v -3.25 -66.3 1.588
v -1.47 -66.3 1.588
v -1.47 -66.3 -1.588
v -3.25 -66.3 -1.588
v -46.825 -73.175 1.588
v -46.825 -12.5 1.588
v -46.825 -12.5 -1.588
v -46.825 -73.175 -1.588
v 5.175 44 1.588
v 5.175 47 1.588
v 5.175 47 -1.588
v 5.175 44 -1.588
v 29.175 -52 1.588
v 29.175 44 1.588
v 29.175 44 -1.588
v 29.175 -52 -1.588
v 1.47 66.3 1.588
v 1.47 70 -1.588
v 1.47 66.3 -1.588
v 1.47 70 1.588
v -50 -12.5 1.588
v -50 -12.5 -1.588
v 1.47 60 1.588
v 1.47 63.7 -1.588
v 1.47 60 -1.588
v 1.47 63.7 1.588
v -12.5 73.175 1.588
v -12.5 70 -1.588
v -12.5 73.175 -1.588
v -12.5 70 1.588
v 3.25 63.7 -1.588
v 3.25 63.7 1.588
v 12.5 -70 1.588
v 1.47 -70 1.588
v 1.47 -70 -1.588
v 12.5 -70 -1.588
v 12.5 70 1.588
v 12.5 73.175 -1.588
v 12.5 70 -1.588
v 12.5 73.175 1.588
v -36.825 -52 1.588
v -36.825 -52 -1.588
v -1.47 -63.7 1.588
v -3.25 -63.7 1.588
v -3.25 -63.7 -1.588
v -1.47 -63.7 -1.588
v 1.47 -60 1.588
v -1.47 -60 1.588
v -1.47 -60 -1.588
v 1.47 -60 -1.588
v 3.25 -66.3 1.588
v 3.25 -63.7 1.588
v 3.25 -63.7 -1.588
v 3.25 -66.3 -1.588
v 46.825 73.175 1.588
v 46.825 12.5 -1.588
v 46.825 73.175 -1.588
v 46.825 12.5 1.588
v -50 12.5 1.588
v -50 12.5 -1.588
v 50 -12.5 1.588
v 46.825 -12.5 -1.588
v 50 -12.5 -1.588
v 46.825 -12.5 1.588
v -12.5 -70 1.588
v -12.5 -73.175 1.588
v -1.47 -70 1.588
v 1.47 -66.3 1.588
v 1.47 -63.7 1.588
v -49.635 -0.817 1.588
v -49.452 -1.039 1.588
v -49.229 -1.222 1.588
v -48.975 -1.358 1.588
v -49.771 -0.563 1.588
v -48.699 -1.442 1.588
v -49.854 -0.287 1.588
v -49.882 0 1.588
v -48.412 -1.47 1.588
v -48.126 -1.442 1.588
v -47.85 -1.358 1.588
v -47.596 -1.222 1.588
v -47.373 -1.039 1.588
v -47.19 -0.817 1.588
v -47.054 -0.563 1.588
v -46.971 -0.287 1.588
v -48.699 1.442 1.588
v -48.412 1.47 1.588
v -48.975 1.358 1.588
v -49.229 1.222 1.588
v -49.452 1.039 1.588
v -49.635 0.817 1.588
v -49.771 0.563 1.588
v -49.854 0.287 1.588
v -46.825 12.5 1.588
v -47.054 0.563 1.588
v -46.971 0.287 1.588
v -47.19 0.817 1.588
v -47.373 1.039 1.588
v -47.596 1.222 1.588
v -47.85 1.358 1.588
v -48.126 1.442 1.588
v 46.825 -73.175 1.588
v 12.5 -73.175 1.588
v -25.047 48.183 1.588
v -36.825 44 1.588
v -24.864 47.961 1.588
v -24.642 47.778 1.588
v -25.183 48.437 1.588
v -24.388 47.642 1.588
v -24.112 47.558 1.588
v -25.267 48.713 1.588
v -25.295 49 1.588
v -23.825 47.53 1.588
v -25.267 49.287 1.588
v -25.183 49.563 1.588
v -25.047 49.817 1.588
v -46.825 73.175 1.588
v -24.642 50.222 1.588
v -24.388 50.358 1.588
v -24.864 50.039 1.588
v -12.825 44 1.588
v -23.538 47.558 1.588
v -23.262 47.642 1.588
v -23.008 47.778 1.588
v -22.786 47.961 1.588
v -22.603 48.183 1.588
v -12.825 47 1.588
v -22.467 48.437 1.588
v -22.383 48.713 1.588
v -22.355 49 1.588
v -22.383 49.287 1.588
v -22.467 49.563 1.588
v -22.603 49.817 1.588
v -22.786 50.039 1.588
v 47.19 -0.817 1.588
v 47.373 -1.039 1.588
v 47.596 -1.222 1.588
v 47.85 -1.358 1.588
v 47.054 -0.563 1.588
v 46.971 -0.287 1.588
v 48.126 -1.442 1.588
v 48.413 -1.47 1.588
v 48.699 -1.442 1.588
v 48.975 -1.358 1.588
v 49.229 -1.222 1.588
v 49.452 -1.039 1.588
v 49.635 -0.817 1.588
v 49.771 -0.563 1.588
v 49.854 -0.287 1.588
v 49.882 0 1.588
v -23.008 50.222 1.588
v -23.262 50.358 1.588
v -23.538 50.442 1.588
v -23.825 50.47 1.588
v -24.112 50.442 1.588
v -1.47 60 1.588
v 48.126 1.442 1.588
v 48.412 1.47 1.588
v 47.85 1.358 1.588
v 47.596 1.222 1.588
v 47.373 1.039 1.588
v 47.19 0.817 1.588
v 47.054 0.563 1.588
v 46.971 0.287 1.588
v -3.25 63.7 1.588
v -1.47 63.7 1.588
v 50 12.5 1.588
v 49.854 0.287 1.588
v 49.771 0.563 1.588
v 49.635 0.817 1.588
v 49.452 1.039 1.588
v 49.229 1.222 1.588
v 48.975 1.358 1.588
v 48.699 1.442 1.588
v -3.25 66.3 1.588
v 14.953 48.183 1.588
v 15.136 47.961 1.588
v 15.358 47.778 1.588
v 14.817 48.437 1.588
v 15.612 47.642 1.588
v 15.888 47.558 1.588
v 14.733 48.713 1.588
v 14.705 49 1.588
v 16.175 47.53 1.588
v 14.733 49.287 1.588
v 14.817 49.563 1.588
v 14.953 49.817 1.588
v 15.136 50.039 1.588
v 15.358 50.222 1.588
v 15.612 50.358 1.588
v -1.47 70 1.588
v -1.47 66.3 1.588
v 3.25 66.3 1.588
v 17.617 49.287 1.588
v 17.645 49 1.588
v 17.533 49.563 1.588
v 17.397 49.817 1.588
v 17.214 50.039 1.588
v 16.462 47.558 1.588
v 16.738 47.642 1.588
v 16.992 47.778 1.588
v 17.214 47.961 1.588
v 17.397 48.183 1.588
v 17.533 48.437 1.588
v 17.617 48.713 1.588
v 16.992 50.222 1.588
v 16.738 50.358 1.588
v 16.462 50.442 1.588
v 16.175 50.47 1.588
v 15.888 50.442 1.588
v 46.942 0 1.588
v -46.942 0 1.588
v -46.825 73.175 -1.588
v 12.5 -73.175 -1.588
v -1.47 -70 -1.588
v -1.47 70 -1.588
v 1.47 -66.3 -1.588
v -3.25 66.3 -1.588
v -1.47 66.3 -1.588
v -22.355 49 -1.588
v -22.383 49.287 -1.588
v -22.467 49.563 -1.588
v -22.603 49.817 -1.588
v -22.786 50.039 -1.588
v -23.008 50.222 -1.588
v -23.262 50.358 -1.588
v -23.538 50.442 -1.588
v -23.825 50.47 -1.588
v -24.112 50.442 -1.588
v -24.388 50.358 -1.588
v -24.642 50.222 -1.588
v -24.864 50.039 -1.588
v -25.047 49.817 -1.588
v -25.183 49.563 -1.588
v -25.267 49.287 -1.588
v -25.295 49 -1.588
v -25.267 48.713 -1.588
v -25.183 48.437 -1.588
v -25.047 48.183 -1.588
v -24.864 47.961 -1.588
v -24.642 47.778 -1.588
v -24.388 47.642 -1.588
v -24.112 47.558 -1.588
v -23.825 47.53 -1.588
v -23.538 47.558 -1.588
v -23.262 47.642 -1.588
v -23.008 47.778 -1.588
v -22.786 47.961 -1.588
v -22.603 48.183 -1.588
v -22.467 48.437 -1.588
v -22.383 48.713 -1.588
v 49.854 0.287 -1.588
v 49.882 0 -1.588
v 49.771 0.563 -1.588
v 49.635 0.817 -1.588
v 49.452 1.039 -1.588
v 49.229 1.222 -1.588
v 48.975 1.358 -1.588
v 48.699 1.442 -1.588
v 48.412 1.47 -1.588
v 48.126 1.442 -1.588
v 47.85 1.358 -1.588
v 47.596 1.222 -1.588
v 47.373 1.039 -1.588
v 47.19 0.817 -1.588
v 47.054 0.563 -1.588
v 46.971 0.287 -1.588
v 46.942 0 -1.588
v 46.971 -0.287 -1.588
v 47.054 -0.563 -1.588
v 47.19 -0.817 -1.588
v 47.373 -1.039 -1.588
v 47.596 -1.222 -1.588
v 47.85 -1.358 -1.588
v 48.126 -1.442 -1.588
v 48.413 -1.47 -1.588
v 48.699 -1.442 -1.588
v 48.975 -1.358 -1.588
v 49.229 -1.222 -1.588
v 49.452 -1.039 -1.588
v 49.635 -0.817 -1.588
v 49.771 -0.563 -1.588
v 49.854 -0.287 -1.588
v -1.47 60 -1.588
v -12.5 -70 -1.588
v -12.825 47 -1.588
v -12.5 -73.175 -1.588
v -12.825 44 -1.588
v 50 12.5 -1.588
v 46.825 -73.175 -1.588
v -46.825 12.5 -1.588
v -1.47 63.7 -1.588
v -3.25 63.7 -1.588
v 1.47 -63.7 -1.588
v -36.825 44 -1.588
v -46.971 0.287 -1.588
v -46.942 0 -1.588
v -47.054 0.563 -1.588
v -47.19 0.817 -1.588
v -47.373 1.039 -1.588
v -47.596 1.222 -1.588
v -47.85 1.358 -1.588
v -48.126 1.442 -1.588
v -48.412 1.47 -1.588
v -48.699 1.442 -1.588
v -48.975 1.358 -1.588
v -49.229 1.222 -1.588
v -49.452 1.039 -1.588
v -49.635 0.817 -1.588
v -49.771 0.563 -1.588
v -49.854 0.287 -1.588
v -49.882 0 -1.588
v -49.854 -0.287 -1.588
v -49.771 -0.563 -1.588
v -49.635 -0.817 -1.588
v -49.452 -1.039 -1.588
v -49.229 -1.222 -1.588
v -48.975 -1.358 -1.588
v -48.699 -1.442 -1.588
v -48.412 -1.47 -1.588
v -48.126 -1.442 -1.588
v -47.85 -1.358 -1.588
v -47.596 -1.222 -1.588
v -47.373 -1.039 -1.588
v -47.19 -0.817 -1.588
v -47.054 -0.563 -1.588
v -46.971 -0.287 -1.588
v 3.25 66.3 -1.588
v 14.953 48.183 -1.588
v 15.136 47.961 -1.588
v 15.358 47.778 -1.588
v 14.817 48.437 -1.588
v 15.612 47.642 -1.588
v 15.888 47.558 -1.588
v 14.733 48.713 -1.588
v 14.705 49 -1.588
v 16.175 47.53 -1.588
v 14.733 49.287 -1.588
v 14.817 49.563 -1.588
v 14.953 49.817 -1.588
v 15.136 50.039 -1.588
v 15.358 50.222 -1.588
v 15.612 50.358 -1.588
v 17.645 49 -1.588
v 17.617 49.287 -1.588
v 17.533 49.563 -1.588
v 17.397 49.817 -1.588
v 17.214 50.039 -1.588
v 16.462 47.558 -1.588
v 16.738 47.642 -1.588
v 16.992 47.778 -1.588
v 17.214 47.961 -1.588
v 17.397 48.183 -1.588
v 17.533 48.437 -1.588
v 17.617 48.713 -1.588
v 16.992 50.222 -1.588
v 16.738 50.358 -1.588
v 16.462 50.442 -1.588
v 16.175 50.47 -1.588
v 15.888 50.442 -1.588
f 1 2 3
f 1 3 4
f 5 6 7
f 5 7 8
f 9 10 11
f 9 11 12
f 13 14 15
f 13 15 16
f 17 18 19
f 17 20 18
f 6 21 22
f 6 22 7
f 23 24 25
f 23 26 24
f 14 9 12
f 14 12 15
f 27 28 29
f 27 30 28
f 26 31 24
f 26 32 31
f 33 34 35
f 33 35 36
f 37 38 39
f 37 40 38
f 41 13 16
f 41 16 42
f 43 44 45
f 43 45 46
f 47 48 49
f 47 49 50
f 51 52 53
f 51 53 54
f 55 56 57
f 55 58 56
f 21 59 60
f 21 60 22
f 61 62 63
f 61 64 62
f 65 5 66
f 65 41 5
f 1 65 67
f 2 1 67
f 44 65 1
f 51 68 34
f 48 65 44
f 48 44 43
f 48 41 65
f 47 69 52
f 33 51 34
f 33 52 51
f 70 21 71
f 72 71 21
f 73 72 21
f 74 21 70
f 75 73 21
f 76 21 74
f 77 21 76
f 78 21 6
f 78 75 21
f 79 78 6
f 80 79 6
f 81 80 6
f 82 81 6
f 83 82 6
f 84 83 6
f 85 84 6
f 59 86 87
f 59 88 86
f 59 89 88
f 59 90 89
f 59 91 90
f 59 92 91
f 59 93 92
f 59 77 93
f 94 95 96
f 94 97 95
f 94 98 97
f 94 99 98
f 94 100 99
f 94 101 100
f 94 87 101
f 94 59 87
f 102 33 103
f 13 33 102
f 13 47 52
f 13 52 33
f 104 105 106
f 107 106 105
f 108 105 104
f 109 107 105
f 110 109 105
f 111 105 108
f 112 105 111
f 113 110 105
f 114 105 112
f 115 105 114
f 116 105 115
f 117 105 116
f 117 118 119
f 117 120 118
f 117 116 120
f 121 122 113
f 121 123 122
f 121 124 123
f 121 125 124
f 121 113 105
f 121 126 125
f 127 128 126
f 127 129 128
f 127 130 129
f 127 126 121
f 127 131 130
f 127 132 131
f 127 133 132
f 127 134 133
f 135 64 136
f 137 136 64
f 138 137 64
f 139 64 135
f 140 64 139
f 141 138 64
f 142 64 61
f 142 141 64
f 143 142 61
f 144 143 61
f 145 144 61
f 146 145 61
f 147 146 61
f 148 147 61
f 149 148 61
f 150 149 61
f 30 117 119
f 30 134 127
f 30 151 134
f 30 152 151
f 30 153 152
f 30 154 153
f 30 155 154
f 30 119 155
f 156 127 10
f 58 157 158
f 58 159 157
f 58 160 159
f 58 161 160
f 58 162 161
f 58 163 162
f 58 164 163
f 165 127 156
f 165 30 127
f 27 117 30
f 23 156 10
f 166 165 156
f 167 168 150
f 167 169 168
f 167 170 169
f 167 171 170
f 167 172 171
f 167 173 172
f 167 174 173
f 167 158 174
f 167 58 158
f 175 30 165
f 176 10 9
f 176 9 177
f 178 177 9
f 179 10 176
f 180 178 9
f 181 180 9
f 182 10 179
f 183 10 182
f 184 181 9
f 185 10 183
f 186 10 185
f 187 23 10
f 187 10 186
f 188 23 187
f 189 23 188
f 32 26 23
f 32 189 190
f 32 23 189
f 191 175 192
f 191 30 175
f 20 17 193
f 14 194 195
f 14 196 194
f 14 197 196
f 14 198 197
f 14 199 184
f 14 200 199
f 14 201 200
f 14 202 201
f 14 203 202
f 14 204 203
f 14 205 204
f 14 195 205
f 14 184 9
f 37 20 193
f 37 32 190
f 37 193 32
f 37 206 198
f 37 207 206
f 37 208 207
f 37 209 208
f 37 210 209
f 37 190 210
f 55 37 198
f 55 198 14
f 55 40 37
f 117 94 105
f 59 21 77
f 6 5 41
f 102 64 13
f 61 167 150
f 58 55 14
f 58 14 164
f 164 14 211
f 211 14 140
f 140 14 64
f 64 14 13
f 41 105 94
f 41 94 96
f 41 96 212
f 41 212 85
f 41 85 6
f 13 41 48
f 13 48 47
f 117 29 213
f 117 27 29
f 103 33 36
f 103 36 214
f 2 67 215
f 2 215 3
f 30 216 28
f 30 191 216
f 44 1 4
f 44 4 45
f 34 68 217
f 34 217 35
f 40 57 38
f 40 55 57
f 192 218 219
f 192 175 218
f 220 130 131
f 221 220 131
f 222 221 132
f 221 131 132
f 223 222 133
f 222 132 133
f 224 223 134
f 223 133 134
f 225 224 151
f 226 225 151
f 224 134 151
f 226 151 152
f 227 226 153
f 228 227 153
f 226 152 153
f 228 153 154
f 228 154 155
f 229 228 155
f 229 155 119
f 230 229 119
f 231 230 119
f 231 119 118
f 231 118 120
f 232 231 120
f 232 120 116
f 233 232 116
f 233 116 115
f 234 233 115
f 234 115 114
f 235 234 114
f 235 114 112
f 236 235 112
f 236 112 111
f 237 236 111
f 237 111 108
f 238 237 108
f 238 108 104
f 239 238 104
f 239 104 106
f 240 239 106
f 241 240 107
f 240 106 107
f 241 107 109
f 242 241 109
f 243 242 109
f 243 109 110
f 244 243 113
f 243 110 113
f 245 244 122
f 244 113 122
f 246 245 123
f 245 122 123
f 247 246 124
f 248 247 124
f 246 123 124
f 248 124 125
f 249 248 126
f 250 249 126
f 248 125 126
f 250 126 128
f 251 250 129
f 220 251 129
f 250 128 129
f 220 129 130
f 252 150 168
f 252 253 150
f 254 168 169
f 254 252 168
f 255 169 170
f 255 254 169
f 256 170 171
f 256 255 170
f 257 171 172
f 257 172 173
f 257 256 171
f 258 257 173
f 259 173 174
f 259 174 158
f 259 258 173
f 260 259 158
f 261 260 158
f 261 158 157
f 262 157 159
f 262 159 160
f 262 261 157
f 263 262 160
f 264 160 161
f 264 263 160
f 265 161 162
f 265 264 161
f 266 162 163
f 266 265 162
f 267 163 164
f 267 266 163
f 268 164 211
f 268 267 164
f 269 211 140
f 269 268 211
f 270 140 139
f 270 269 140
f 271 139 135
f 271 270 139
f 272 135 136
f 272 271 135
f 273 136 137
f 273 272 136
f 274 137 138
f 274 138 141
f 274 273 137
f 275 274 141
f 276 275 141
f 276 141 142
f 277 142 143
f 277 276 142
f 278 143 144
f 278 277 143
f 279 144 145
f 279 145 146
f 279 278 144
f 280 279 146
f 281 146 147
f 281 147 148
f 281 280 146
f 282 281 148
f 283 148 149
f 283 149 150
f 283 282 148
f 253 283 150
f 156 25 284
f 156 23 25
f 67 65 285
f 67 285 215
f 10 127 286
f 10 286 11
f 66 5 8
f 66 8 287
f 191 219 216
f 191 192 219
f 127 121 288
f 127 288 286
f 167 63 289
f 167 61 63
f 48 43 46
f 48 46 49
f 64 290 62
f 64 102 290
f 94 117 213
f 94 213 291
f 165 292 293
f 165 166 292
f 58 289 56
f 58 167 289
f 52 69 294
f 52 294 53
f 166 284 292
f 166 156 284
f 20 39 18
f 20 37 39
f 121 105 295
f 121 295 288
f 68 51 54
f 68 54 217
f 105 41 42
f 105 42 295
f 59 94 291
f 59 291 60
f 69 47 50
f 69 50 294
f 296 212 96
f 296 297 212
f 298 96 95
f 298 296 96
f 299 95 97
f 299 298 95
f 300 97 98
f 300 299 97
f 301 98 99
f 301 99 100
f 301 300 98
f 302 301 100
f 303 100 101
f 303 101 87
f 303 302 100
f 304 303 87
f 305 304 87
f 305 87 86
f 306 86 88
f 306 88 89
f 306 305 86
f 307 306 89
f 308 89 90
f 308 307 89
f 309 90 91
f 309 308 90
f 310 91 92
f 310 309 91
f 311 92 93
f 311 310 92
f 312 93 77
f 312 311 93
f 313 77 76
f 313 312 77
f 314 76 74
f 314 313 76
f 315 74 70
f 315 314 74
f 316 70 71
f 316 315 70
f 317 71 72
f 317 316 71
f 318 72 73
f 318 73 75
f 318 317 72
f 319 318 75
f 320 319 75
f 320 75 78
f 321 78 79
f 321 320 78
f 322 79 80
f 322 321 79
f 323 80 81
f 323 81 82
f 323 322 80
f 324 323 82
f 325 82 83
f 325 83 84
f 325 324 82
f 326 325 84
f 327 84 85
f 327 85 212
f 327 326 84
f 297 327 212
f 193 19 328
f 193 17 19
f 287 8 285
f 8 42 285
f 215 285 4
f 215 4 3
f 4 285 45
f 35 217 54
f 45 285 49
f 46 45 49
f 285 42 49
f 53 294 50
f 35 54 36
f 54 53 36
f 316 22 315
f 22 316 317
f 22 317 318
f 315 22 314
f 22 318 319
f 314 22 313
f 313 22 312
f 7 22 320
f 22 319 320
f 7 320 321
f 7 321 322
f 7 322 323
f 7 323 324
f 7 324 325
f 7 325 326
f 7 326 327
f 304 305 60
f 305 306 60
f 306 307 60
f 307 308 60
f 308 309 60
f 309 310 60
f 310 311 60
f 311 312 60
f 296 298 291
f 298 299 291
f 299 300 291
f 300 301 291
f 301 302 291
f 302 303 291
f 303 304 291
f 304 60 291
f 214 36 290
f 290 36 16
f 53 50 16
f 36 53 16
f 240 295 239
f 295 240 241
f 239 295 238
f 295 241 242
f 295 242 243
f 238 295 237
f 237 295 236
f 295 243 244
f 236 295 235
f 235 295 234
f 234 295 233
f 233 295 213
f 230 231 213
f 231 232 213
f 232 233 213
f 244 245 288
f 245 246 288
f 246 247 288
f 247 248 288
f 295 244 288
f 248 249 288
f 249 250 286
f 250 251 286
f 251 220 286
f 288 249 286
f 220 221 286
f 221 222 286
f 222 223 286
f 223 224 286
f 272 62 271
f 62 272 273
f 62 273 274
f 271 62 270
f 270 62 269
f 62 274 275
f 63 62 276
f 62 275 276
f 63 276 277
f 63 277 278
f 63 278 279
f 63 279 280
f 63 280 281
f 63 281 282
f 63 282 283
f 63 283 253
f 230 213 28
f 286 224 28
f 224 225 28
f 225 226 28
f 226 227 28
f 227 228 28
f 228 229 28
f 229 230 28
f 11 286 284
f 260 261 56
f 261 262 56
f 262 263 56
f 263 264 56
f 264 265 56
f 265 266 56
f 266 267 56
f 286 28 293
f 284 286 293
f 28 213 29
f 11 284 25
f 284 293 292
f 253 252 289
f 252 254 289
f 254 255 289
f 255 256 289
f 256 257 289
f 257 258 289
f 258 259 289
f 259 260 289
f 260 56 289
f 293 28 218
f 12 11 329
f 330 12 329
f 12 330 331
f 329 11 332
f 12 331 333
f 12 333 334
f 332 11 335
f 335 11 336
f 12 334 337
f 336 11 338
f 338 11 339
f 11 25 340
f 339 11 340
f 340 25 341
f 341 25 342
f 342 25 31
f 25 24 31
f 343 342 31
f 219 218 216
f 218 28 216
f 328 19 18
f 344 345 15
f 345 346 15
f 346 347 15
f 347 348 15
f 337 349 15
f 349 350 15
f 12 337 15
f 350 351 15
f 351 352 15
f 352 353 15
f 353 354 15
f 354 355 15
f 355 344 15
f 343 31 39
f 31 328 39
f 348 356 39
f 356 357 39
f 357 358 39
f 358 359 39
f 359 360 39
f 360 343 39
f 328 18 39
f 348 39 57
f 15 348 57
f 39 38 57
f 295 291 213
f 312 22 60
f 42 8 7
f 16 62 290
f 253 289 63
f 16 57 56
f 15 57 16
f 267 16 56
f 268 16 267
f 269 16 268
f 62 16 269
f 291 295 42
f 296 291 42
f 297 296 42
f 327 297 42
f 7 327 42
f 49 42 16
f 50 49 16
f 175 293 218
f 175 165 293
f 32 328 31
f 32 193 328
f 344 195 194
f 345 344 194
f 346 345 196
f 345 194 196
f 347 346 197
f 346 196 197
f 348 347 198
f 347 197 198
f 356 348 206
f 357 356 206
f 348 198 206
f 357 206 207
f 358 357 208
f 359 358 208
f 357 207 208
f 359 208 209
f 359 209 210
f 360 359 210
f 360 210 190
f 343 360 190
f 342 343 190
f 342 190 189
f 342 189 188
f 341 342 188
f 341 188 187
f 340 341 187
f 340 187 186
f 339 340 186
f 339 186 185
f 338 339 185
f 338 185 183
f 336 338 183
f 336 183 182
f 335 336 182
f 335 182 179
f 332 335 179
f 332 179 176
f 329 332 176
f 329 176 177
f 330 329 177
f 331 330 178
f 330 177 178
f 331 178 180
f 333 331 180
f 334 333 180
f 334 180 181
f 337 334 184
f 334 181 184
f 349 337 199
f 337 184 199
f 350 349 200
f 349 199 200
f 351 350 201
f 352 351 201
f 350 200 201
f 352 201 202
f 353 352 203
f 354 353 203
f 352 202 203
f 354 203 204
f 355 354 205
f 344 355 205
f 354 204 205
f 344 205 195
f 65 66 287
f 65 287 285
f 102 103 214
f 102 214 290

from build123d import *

# Parameters (mm, degrees)
SKETCH1_R               = 1.47
BOSS_EXTRUDE1_DEPTH     = 1.5875
SKETCH2_R               = 1.47
CUT_EXTRUDE1_DEPTH      = 4.175
CUT_EXTRUDE3_DEPTH      = 1
CUT_EXTRUDE3_DEPTH_BACK = 4.175


with BuildPart() as part:
    # Sketch1 → Boss-Extrude1 (new body, symmetric)
    with BuildSketch(Plane.XY):
        Polygon((-12.5, 73.175), (-46.825, 73.175), (-46.825, 12.5), (-50, 12.5), (-50, -12.5), (-46.825, -12.5), (-46.825, -73.175), (-12.5, -73.175), (-12.5, -70), (-1.47, -70), (-1.47, -66.3), (-3.25, -66.3), (-3.25, -63.7), (-1.47, -63.7), (-1.47, -60), (1.47, -60), (1.47, -63.7), (3.25, -63.7), (3.25, -66.3), (1.47, -66.3), (1.47, -70), (12.5, -70), (12.5, -73.175), (46.825, -73.175), (46.825, -12.5), (50, -12.5), (50, 12.5), (46.825, 12.5), (46.825, 73.175), (12.5, 73.175), (12.5, 70), (1.47, 70), (1.47, 66.3), (3.25, 66.3), (3.25, 63.7), (1.47, 63.7), (1.47, 60), (-1.47, 60), (-1.47, 63.7), (-3.25, 63.7), (-3.25, 66.3), (-1.47, 66.3), (-1.47, 70), (-12.5, 70), align=None)
        with Locations((-48.4125, 0)):
            Circle(SKETCH1_R, mode=Mode.SUBTRACT)
        with Locations((48.4125, 0)):
            Circle(SKETCH1_R, mode=Mode.SUBTRACT)
    extrude(amount=BOSS_EXTRUDE1_DEPTH, both=True)

    # Sketch2 → Cut-Extrude1 (cut, through all)
    with BuildSketch(Plane.XY.offset(1.5875)):
        with Locations((16.175, 49)):
            Circle(SKETCH2_R)
        with Locations((-23.825, 49)):
            Circle(SKETCH2_R)
    extrude(amount=-CUT_EXTRUDE1_DEPTH, mode=Mode.SUBTRACT)

    # Sketch3 → Cut-Extrude3 (cut, two sides)
    with BuildSketch(Plane.XY.offset(1.5875)) as cut_extrude3_sk:
        Polygon((-36.825, 44), (-12.825, 44), (-12.825, 47), (5.175, 47), (5.175, 44), (29.175, 44), (29.175, -52), (-36.825, -52), align=None)
    extrude(amount=CUT_EXTRUDE3_DEPTH, mode=Mode.SUBTRACT)
    extrude(cut_extrude3_sk.sketch, amount=-CUT_EXTRUDE3_DEPTH_BACK, mode=Mode.SUBTRACT)


solid = part.part
